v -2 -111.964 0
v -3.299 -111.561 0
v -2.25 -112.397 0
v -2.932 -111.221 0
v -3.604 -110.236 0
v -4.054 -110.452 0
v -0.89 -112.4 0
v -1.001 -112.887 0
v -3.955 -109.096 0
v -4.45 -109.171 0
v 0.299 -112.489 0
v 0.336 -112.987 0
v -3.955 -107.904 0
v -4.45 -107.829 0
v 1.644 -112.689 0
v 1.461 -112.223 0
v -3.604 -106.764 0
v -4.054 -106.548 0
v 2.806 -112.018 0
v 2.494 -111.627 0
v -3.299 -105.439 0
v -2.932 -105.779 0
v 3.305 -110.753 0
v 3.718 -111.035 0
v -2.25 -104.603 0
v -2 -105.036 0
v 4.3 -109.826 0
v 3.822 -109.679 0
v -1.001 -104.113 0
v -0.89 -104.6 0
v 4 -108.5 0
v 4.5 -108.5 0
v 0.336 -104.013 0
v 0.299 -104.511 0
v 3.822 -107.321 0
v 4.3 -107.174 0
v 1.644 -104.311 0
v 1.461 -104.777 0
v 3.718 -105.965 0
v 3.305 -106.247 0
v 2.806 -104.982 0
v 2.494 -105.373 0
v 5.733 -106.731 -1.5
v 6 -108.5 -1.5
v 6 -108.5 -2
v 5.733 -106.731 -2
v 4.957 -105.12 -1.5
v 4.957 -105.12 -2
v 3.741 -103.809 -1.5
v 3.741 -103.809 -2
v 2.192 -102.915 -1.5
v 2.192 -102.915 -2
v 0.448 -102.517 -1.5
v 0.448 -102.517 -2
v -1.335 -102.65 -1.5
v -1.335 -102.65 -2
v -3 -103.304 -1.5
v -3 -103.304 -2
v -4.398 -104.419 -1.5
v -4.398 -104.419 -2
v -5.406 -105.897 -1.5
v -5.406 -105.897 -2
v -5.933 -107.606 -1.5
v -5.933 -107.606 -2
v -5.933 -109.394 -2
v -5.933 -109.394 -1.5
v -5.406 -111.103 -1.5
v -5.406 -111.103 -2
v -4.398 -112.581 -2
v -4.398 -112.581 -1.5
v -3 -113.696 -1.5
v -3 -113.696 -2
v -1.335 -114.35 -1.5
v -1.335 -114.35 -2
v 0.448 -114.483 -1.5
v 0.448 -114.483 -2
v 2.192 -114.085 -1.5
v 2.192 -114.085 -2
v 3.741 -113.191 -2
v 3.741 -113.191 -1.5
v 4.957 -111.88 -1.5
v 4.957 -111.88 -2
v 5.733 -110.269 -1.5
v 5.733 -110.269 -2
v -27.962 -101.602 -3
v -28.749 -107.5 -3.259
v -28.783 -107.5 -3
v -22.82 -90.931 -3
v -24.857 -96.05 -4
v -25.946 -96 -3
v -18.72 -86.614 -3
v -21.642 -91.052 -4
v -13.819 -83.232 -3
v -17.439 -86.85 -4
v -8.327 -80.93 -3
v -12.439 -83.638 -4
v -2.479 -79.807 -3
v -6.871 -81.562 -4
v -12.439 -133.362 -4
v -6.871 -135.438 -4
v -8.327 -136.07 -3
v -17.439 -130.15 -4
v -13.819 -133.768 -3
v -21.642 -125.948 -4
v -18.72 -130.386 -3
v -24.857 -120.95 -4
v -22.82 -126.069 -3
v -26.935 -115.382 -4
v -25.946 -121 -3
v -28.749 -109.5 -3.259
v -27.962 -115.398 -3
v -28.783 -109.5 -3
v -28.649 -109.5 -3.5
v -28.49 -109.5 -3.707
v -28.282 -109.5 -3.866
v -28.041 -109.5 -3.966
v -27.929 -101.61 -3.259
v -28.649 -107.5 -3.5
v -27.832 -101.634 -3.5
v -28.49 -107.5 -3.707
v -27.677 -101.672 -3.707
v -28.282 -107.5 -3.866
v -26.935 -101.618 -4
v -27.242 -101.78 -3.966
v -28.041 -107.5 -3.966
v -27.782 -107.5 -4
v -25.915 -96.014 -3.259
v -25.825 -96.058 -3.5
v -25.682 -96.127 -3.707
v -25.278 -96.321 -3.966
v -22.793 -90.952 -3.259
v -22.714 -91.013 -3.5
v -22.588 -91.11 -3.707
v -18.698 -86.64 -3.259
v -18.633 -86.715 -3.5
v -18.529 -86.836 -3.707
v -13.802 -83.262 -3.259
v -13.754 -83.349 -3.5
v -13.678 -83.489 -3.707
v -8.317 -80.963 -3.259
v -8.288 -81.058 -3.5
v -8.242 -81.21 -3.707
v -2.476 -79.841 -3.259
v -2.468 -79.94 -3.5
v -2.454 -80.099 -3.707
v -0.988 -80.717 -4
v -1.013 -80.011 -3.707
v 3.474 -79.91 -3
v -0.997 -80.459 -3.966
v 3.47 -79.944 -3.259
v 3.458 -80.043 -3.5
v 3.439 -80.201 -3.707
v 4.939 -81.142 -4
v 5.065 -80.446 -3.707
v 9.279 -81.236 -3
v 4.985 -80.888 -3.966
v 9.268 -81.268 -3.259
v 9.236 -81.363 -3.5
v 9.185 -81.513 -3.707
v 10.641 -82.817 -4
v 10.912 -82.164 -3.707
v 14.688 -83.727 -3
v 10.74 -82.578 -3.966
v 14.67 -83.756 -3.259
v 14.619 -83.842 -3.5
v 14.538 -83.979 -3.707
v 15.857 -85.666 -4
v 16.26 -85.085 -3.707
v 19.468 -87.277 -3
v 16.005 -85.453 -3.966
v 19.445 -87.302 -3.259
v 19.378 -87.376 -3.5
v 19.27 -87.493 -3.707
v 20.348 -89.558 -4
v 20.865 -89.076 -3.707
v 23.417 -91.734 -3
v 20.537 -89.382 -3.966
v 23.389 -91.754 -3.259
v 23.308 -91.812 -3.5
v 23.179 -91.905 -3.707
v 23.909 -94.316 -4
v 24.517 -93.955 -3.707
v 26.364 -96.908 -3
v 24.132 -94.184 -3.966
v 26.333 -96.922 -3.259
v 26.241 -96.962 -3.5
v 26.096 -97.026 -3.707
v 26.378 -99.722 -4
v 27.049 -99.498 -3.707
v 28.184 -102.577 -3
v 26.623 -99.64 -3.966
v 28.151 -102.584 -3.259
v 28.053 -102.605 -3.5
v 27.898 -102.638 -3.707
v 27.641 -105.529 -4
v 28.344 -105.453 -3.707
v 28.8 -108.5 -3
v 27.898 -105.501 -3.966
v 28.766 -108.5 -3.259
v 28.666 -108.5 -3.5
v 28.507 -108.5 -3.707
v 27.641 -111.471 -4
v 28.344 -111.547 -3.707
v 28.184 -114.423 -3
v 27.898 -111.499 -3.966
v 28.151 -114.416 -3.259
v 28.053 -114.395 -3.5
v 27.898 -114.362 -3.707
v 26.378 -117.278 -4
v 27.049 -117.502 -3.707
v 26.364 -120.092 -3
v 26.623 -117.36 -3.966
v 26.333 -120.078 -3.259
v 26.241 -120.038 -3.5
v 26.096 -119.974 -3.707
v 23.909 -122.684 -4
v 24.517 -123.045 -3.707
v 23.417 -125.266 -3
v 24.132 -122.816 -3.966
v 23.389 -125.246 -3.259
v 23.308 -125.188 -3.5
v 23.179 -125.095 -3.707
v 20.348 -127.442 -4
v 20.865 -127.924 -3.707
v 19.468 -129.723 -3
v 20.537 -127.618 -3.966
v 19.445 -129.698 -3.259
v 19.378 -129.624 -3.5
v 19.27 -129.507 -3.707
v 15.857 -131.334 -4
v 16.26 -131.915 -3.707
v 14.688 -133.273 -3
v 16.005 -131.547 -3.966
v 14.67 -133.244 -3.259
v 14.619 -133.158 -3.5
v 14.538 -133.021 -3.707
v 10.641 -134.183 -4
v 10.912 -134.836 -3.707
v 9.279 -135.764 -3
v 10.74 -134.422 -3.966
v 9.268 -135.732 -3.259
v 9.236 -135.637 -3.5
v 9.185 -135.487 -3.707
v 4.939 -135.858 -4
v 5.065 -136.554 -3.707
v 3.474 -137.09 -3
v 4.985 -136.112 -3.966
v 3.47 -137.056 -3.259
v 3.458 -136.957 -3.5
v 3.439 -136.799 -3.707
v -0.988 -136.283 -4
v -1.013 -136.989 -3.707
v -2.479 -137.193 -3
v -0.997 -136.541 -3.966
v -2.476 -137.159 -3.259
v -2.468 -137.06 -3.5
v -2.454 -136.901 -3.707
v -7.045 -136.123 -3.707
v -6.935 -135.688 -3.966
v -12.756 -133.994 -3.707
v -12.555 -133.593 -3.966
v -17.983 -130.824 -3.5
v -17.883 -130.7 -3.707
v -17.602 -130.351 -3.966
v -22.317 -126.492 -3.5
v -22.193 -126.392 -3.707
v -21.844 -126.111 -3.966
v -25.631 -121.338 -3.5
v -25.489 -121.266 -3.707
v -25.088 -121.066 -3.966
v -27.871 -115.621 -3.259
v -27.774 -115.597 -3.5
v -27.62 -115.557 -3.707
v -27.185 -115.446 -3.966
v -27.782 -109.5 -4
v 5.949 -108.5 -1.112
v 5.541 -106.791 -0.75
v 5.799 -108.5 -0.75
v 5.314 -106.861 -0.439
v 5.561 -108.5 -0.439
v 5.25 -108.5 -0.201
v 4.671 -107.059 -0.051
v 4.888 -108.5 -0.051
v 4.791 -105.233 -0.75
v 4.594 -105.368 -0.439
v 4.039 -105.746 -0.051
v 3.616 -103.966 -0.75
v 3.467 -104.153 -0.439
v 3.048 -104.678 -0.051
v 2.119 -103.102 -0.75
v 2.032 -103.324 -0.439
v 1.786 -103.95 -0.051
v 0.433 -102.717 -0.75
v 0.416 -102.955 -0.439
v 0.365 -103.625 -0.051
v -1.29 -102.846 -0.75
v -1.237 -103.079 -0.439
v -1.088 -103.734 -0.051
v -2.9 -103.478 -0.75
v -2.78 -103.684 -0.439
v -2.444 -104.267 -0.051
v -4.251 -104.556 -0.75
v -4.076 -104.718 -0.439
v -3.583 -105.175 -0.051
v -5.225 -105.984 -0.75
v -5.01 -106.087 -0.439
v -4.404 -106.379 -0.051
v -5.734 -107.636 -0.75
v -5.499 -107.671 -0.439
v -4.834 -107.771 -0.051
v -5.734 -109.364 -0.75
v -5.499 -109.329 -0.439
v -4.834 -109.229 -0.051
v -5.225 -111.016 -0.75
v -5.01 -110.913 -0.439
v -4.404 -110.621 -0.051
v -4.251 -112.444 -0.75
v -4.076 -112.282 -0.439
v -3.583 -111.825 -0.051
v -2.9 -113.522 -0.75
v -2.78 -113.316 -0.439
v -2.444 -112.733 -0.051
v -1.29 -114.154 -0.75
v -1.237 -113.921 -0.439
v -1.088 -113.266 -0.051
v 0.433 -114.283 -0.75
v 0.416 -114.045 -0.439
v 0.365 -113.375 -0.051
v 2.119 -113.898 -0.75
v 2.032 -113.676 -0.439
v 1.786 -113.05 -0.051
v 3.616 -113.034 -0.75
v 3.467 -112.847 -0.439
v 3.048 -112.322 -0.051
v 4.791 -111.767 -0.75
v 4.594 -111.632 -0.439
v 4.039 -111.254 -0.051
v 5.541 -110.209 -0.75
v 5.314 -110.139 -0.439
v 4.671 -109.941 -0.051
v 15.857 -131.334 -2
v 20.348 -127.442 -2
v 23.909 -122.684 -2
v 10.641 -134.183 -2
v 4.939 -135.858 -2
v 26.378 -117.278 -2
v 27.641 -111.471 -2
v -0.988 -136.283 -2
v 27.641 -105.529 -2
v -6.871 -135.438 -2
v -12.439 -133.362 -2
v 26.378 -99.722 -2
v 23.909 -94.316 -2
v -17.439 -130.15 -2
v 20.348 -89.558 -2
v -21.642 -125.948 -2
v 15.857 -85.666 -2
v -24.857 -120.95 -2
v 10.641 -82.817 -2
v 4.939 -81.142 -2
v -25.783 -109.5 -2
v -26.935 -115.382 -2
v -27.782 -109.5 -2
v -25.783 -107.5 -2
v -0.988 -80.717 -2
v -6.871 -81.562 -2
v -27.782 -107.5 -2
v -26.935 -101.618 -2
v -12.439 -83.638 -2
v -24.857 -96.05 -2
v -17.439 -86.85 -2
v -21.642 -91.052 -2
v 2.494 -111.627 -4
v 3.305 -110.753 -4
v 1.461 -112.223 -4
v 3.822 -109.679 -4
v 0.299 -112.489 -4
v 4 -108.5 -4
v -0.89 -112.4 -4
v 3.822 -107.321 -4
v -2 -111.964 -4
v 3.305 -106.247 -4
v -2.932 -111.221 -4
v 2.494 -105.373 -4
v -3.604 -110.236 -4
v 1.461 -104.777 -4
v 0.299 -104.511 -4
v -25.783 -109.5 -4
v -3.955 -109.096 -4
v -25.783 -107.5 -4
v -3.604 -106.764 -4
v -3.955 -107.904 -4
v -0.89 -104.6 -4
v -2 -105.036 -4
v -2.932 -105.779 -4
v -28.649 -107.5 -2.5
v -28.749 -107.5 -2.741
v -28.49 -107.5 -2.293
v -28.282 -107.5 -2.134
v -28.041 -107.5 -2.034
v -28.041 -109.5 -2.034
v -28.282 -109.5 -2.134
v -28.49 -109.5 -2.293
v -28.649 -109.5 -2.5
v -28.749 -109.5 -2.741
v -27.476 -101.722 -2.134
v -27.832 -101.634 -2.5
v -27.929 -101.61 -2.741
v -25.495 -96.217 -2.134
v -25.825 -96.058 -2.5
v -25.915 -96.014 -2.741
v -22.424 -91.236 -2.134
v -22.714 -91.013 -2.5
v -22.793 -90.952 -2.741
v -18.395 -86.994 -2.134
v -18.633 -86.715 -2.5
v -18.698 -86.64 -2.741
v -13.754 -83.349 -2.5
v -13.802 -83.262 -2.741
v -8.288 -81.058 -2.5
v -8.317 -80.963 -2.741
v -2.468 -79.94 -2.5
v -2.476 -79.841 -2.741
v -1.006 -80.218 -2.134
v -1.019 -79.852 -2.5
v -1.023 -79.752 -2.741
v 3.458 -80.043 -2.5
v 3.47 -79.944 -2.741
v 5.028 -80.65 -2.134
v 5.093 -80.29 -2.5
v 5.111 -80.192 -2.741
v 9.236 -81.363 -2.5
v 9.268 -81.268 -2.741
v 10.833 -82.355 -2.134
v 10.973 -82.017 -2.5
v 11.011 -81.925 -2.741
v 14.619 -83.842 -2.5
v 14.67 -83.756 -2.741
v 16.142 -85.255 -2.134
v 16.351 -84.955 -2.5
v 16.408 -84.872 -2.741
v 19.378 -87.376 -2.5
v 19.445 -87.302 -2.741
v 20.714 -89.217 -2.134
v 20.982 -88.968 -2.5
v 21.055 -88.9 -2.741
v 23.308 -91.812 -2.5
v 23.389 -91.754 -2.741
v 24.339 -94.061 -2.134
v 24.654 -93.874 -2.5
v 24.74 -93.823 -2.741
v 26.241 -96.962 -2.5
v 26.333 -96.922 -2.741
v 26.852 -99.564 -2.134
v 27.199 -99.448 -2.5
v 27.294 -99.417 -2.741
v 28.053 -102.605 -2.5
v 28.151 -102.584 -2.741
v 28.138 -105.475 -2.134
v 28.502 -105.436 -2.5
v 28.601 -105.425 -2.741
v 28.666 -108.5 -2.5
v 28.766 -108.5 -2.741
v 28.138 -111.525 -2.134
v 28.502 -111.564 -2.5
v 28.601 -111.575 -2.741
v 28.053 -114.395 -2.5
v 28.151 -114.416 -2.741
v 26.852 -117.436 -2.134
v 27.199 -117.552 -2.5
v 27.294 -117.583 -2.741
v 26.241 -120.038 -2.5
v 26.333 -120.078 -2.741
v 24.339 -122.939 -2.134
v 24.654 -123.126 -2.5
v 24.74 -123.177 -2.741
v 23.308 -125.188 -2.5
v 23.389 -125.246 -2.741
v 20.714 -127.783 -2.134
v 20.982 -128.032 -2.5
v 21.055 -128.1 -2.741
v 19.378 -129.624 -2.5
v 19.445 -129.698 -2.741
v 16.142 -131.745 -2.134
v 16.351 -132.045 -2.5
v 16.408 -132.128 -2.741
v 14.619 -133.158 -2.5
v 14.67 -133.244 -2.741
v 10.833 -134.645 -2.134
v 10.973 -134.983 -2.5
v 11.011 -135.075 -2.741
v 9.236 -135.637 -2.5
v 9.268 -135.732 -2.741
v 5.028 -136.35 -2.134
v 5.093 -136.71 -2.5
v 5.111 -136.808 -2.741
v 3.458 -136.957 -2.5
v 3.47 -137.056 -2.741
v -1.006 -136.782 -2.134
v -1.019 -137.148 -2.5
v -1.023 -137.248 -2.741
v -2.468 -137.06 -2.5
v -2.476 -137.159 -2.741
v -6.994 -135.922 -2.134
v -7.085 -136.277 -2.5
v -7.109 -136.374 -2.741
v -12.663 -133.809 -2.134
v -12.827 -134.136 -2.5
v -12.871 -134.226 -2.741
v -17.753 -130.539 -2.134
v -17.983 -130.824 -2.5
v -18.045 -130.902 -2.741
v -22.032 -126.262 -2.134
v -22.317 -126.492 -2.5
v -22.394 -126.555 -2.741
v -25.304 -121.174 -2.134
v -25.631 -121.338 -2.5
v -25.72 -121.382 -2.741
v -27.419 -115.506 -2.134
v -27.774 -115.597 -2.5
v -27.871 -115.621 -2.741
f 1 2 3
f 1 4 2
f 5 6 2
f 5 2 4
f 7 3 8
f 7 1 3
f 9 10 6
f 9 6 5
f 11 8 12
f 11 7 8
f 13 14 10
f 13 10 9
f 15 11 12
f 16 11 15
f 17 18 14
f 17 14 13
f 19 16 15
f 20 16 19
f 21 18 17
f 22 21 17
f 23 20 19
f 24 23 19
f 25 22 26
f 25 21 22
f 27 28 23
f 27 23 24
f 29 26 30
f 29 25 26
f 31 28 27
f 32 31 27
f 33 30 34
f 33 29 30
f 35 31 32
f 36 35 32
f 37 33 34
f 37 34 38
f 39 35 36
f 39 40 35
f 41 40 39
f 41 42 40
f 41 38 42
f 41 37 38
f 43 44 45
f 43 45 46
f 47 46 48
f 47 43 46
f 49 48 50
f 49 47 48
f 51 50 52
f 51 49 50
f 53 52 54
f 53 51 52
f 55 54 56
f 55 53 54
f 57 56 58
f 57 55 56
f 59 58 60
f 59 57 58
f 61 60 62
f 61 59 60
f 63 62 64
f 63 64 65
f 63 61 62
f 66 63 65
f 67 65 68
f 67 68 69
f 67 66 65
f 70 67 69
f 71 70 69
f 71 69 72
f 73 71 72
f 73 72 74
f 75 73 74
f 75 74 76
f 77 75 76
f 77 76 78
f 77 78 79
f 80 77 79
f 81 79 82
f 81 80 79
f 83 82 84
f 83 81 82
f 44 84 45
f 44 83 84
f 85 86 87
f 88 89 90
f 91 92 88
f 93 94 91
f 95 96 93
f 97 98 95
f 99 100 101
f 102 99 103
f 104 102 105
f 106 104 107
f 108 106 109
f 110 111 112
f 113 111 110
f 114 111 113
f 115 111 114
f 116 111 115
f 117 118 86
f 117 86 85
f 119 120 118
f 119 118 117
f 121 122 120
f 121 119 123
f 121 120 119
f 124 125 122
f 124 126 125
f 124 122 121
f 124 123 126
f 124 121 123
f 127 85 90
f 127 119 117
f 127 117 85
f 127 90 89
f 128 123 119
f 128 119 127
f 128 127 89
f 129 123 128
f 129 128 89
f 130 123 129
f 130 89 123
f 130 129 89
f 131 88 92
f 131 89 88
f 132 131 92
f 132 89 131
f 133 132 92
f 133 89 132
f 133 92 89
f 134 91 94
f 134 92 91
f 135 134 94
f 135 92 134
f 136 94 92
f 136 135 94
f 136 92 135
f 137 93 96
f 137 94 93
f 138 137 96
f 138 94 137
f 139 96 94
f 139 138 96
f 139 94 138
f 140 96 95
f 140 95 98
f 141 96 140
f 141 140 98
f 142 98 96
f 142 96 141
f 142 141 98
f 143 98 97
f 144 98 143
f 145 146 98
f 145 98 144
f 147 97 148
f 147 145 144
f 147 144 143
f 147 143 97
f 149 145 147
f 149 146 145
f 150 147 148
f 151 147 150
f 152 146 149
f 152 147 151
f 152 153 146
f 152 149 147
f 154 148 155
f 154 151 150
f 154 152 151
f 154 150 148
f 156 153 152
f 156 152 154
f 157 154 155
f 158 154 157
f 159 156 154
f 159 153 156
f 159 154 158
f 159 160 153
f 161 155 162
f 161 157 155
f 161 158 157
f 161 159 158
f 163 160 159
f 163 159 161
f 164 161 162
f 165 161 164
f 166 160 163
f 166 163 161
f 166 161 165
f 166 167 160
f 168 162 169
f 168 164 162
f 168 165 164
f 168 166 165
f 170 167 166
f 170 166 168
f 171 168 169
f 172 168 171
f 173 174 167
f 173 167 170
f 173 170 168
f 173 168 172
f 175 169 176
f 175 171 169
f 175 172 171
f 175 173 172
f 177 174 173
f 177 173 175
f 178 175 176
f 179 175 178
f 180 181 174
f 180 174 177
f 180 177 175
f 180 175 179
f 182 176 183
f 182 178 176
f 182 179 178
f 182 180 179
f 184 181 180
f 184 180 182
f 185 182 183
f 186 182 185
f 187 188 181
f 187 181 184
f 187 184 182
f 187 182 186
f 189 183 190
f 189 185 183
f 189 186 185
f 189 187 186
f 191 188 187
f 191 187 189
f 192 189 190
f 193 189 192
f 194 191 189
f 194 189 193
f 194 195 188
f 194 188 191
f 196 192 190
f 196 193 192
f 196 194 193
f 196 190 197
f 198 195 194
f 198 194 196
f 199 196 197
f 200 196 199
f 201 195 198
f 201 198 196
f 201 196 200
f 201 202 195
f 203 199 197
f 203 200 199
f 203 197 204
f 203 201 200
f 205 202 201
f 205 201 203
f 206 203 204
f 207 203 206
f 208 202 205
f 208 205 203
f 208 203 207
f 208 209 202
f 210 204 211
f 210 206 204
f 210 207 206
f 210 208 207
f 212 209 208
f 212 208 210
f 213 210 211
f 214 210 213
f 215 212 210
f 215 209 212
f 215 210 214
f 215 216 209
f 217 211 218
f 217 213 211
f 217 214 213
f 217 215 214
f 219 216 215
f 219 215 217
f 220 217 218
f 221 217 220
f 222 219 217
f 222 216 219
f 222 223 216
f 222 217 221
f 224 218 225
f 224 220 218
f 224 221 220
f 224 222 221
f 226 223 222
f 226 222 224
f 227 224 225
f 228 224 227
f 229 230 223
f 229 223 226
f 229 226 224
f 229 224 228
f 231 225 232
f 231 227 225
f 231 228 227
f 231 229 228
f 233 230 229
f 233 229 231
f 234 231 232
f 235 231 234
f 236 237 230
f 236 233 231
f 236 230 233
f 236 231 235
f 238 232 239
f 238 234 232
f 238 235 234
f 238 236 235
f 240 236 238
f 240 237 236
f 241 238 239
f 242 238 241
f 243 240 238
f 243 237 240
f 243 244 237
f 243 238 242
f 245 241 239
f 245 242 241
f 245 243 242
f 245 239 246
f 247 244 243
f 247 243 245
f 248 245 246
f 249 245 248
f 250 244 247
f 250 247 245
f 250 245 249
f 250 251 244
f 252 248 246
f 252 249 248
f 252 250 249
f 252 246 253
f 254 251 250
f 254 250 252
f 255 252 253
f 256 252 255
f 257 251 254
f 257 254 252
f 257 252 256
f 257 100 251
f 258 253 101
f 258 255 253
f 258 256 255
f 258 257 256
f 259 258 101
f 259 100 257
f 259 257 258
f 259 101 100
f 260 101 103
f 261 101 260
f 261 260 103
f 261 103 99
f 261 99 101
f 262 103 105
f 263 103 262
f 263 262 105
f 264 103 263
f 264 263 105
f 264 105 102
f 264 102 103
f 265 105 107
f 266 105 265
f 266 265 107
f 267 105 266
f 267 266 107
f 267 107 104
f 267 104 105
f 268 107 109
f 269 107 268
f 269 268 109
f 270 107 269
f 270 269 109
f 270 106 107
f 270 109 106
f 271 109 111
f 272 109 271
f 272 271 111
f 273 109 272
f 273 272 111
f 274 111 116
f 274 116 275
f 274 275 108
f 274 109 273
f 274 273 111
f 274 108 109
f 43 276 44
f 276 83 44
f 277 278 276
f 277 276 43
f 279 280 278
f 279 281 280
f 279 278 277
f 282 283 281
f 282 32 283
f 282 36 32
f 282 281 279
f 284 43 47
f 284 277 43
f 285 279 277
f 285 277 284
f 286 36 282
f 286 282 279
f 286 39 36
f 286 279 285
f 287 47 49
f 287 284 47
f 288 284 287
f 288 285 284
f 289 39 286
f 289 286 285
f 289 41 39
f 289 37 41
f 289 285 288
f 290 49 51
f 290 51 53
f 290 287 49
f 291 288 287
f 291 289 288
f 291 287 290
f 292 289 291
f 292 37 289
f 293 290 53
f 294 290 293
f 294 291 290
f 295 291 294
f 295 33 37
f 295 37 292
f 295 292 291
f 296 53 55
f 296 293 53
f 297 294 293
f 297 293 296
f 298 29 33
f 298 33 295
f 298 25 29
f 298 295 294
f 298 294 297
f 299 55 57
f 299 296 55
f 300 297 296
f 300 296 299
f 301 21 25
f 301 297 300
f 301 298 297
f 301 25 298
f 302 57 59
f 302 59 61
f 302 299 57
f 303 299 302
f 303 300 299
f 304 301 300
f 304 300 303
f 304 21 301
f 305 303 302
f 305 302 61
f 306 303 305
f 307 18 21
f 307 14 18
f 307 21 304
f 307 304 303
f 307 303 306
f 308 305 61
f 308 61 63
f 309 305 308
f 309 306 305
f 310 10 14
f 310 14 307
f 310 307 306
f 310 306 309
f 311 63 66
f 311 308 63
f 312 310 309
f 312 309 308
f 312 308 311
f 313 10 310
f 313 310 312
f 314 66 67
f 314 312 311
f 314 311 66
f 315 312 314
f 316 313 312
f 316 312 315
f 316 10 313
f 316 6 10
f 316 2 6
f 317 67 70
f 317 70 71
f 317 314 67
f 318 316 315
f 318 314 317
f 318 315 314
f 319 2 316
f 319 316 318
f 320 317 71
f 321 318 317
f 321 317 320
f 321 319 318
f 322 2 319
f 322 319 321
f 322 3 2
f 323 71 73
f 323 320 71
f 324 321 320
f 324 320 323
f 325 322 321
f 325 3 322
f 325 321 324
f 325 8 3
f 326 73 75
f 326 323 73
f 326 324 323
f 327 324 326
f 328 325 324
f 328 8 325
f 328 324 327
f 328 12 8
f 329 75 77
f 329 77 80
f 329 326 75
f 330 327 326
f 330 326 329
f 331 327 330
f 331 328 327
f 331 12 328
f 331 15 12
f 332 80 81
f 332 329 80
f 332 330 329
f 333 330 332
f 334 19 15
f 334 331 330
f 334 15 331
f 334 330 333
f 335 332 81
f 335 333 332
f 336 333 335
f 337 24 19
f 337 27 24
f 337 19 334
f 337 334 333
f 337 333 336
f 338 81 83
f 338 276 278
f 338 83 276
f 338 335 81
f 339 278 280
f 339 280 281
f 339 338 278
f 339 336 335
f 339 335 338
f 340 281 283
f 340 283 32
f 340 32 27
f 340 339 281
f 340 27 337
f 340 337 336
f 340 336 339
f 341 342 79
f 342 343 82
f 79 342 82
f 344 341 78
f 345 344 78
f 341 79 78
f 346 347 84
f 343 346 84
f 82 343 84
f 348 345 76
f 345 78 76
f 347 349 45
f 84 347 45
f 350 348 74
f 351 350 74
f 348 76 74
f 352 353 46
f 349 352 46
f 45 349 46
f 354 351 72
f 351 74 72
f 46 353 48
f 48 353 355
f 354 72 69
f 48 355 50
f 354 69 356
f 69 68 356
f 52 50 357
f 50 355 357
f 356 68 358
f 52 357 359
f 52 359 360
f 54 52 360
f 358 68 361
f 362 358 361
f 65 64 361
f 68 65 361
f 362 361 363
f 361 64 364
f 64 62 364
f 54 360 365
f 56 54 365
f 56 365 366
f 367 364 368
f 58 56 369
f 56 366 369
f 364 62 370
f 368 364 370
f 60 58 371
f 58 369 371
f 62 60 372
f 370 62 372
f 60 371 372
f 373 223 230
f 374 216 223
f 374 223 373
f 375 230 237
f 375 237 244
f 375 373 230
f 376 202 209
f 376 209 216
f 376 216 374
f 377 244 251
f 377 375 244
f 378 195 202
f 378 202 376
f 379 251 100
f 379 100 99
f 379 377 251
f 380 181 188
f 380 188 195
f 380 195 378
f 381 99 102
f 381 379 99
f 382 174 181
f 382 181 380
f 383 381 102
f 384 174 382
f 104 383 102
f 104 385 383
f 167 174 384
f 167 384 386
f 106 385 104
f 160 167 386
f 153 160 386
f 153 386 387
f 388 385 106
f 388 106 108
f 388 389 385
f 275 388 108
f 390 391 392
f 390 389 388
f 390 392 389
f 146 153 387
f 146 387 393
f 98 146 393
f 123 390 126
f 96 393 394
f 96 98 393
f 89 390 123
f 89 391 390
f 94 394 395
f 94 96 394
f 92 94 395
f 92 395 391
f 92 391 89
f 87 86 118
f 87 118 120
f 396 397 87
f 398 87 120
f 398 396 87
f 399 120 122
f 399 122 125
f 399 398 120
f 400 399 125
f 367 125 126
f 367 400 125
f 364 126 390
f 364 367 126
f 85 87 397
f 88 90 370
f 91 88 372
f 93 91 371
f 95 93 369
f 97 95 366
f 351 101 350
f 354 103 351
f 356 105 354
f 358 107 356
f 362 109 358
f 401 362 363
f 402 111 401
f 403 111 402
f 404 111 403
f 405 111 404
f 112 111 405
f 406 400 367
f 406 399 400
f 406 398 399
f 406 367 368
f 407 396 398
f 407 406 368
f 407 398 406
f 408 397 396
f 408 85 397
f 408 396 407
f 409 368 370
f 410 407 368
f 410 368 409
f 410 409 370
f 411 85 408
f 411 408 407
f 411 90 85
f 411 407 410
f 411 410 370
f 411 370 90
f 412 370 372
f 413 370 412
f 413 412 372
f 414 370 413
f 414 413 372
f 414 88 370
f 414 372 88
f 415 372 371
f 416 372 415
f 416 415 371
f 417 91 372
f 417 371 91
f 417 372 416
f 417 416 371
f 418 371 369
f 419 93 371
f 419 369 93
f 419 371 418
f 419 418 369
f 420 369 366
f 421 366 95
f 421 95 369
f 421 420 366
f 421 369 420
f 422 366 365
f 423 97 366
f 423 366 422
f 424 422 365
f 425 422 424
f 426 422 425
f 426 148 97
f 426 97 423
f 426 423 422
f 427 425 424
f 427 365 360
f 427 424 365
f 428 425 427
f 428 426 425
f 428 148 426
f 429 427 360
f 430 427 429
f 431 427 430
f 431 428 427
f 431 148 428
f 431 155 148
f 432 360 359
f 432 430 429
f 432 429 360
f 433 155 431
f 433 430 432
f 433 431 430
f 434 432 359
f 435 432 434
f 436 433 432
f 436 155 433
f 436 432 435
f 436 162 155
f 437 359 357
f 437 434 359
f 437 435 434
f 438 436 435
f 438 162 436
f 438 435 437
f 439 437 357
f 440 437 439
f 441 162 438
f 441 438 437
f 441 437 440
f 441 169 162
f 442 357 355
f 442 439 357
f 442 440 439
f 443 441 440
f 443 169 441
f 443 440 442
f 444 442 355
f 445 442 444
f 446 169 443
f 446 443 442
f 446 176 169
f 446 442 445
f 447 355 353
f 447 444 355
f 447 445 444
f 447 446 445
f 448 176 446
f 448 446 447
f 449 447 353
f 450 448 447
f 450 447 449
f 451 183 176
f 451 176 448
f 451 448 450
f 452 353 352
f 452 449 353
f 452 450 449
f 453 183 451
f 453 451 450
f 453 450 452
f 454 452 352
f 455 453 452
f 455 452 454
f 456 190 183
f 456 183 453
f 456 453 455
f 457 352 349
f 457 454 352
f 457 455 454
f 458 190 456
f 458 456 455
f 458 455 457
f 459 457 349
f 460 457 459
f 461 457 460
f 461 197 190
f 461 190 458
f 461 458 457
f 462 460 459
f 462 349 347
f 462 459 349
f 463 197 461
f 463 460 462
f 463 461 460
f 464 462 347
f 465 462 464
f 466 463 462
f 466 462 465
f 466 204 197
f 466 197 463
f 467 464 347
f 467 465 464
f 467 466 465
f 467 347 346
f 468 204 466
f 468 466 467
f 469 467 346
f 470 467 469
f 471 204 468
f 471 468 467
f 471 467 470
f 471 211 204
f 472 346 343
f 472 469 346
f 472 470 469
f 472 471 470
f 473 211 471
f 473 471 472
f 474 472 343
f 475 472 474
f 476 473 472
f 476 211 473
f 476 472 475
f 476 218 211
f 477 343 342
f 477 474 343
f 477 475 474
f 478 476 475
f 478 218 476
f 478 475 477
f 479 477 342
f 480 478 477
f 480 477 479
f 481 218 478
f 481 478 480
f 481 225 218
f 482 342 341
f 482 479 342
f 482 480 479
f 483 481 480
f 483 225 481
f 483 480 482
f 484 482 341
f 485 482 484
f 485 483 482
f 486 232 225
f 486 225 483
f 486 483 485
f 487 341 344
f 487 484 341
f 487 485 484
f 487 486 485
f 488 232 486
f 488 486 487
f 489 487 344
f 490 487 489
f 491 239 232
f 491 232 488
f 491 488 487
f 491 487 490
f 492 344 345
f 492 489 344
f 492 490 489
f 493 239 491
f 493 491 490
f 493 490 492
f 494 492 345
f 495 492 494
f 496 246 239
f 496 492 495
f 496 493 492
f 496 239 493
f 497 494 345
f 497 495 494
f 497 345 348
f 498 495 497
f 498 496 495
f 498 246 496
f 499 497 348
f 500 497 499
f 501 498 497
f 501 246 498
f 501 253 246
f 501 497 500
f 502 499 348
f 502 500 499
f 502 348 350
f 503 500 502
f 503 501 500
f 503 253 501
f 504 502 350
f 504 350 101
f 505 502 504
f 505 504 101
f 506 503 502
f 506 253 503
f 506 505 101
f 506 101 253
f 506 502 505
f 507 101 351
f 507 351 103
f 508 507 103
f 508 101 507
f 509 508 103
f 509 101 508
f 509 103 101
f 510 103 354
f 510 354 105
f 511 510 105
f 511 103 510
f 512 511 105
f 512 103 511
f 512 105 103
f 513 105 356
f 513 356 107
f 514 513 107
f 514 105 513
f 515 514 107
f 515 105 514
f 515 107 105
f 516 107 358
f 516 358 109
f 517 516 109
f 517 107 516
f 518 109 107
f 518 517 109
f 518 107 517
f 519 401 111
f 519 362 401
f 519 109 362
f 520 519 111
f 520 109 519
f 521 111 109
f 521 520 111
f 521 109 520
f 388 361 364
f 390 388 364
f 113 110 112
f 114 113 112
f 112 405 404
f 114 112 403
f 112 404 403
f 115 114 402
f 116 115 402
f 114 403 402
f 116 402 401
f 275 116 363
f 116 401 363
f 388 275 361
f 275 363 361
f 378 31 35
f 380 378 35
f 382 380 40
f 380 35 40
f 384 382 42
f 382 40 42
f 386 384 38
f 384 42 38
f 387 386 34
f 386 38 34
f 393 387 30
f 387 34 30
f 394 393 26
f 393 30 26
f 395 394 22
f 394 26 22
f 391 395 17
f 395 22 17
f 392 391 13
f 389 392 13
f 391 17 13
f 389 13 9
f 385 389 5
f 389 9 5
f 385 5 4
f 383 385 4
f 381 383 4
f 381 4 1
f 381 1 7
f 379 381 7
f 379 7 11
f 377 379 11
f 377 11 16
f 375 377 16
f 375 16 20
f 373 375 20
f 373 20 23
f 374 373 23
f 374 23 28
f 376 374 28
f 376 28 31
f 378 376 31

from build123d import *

# Parameters (mm, degrees)
SKETCH1_R           = 6
BOSS_EXTRUDE1_DEPTH = 2
SKETCH2_R           = 28.8
BOSS_EXTRUDE2_DEPTH = 2
SKETCH3_R           = 4
CUT_EXTRUDE1_DEPTH  = 141.3450391
FILLET1_R           = 1.5
FILLET2_R           = 1
SKETCH4_W           = 6
SKETCH4_H           = 2
CUT_EXTRUDE2_DEPTH  = 141.345039121


with BuildPart() as part:
    # Sketch1 → Boss-Extrude1 (new body)
    with BuildSketch(Plane.XY):
        with Locations((0, -108.5)):
            Circle(SKETCH1_R)
    extrude(amount=-BOSS_EXTRUDE1_DEPTH)

    # Sketch2 → Boss-Extrude2 (add)
    with BuildSketch(Plane(origin=(0, 0, -2), x_dir=(-1, 0, 0), z_dir=(0, 0, -1))):
        with Locations((0, -108.5)):
            Circle(SKETCH2_R)
    extrude(amount=BOSS_EXTRUDE2_DEPTH)

    # Sketch3 → Cut-Extrude1 (cut, through all)
    with BuildSketch(Plane.XY):
        with Locations((0, -108.5)):
            Circle(SKETCH3_R)
    extrude(amount=-CUT_EXTRUDE1_DEPTH, mode=Mode.SUBTRACT)

    # Fillet1
    fillet1_edges = [part.edges().sort_by_distance(p)[0] for p in [
        (-6, -108.5, 0),
    ]]
    fillet(fillet1_edges, radius=FILLET1_R)

    # Fillet2
    fillet2_edges = [part.edges().sort_by_distance(p)[0] for p in [
        (28.8, -108.5, -2),
        (28.8, -108.5, -4),
    ]]
    fillet(fillet2_edges, radius=FILLET2_R - 0.0001)  # a hair under: the kernel refuses the full size

    # Sketch4 → Cut-Extrude2 (cut, through all)
    with BuildSketch(Plane.XY):
        with Locations((-28.782633653, -108.5)):
            Rectangle(SKETCH4_W, SKETCH4_H)
    extrude(amount=-CUT_EXTRUDE2_DEPTH, mode=Mode.SUBTRACT)


solid = part.part
